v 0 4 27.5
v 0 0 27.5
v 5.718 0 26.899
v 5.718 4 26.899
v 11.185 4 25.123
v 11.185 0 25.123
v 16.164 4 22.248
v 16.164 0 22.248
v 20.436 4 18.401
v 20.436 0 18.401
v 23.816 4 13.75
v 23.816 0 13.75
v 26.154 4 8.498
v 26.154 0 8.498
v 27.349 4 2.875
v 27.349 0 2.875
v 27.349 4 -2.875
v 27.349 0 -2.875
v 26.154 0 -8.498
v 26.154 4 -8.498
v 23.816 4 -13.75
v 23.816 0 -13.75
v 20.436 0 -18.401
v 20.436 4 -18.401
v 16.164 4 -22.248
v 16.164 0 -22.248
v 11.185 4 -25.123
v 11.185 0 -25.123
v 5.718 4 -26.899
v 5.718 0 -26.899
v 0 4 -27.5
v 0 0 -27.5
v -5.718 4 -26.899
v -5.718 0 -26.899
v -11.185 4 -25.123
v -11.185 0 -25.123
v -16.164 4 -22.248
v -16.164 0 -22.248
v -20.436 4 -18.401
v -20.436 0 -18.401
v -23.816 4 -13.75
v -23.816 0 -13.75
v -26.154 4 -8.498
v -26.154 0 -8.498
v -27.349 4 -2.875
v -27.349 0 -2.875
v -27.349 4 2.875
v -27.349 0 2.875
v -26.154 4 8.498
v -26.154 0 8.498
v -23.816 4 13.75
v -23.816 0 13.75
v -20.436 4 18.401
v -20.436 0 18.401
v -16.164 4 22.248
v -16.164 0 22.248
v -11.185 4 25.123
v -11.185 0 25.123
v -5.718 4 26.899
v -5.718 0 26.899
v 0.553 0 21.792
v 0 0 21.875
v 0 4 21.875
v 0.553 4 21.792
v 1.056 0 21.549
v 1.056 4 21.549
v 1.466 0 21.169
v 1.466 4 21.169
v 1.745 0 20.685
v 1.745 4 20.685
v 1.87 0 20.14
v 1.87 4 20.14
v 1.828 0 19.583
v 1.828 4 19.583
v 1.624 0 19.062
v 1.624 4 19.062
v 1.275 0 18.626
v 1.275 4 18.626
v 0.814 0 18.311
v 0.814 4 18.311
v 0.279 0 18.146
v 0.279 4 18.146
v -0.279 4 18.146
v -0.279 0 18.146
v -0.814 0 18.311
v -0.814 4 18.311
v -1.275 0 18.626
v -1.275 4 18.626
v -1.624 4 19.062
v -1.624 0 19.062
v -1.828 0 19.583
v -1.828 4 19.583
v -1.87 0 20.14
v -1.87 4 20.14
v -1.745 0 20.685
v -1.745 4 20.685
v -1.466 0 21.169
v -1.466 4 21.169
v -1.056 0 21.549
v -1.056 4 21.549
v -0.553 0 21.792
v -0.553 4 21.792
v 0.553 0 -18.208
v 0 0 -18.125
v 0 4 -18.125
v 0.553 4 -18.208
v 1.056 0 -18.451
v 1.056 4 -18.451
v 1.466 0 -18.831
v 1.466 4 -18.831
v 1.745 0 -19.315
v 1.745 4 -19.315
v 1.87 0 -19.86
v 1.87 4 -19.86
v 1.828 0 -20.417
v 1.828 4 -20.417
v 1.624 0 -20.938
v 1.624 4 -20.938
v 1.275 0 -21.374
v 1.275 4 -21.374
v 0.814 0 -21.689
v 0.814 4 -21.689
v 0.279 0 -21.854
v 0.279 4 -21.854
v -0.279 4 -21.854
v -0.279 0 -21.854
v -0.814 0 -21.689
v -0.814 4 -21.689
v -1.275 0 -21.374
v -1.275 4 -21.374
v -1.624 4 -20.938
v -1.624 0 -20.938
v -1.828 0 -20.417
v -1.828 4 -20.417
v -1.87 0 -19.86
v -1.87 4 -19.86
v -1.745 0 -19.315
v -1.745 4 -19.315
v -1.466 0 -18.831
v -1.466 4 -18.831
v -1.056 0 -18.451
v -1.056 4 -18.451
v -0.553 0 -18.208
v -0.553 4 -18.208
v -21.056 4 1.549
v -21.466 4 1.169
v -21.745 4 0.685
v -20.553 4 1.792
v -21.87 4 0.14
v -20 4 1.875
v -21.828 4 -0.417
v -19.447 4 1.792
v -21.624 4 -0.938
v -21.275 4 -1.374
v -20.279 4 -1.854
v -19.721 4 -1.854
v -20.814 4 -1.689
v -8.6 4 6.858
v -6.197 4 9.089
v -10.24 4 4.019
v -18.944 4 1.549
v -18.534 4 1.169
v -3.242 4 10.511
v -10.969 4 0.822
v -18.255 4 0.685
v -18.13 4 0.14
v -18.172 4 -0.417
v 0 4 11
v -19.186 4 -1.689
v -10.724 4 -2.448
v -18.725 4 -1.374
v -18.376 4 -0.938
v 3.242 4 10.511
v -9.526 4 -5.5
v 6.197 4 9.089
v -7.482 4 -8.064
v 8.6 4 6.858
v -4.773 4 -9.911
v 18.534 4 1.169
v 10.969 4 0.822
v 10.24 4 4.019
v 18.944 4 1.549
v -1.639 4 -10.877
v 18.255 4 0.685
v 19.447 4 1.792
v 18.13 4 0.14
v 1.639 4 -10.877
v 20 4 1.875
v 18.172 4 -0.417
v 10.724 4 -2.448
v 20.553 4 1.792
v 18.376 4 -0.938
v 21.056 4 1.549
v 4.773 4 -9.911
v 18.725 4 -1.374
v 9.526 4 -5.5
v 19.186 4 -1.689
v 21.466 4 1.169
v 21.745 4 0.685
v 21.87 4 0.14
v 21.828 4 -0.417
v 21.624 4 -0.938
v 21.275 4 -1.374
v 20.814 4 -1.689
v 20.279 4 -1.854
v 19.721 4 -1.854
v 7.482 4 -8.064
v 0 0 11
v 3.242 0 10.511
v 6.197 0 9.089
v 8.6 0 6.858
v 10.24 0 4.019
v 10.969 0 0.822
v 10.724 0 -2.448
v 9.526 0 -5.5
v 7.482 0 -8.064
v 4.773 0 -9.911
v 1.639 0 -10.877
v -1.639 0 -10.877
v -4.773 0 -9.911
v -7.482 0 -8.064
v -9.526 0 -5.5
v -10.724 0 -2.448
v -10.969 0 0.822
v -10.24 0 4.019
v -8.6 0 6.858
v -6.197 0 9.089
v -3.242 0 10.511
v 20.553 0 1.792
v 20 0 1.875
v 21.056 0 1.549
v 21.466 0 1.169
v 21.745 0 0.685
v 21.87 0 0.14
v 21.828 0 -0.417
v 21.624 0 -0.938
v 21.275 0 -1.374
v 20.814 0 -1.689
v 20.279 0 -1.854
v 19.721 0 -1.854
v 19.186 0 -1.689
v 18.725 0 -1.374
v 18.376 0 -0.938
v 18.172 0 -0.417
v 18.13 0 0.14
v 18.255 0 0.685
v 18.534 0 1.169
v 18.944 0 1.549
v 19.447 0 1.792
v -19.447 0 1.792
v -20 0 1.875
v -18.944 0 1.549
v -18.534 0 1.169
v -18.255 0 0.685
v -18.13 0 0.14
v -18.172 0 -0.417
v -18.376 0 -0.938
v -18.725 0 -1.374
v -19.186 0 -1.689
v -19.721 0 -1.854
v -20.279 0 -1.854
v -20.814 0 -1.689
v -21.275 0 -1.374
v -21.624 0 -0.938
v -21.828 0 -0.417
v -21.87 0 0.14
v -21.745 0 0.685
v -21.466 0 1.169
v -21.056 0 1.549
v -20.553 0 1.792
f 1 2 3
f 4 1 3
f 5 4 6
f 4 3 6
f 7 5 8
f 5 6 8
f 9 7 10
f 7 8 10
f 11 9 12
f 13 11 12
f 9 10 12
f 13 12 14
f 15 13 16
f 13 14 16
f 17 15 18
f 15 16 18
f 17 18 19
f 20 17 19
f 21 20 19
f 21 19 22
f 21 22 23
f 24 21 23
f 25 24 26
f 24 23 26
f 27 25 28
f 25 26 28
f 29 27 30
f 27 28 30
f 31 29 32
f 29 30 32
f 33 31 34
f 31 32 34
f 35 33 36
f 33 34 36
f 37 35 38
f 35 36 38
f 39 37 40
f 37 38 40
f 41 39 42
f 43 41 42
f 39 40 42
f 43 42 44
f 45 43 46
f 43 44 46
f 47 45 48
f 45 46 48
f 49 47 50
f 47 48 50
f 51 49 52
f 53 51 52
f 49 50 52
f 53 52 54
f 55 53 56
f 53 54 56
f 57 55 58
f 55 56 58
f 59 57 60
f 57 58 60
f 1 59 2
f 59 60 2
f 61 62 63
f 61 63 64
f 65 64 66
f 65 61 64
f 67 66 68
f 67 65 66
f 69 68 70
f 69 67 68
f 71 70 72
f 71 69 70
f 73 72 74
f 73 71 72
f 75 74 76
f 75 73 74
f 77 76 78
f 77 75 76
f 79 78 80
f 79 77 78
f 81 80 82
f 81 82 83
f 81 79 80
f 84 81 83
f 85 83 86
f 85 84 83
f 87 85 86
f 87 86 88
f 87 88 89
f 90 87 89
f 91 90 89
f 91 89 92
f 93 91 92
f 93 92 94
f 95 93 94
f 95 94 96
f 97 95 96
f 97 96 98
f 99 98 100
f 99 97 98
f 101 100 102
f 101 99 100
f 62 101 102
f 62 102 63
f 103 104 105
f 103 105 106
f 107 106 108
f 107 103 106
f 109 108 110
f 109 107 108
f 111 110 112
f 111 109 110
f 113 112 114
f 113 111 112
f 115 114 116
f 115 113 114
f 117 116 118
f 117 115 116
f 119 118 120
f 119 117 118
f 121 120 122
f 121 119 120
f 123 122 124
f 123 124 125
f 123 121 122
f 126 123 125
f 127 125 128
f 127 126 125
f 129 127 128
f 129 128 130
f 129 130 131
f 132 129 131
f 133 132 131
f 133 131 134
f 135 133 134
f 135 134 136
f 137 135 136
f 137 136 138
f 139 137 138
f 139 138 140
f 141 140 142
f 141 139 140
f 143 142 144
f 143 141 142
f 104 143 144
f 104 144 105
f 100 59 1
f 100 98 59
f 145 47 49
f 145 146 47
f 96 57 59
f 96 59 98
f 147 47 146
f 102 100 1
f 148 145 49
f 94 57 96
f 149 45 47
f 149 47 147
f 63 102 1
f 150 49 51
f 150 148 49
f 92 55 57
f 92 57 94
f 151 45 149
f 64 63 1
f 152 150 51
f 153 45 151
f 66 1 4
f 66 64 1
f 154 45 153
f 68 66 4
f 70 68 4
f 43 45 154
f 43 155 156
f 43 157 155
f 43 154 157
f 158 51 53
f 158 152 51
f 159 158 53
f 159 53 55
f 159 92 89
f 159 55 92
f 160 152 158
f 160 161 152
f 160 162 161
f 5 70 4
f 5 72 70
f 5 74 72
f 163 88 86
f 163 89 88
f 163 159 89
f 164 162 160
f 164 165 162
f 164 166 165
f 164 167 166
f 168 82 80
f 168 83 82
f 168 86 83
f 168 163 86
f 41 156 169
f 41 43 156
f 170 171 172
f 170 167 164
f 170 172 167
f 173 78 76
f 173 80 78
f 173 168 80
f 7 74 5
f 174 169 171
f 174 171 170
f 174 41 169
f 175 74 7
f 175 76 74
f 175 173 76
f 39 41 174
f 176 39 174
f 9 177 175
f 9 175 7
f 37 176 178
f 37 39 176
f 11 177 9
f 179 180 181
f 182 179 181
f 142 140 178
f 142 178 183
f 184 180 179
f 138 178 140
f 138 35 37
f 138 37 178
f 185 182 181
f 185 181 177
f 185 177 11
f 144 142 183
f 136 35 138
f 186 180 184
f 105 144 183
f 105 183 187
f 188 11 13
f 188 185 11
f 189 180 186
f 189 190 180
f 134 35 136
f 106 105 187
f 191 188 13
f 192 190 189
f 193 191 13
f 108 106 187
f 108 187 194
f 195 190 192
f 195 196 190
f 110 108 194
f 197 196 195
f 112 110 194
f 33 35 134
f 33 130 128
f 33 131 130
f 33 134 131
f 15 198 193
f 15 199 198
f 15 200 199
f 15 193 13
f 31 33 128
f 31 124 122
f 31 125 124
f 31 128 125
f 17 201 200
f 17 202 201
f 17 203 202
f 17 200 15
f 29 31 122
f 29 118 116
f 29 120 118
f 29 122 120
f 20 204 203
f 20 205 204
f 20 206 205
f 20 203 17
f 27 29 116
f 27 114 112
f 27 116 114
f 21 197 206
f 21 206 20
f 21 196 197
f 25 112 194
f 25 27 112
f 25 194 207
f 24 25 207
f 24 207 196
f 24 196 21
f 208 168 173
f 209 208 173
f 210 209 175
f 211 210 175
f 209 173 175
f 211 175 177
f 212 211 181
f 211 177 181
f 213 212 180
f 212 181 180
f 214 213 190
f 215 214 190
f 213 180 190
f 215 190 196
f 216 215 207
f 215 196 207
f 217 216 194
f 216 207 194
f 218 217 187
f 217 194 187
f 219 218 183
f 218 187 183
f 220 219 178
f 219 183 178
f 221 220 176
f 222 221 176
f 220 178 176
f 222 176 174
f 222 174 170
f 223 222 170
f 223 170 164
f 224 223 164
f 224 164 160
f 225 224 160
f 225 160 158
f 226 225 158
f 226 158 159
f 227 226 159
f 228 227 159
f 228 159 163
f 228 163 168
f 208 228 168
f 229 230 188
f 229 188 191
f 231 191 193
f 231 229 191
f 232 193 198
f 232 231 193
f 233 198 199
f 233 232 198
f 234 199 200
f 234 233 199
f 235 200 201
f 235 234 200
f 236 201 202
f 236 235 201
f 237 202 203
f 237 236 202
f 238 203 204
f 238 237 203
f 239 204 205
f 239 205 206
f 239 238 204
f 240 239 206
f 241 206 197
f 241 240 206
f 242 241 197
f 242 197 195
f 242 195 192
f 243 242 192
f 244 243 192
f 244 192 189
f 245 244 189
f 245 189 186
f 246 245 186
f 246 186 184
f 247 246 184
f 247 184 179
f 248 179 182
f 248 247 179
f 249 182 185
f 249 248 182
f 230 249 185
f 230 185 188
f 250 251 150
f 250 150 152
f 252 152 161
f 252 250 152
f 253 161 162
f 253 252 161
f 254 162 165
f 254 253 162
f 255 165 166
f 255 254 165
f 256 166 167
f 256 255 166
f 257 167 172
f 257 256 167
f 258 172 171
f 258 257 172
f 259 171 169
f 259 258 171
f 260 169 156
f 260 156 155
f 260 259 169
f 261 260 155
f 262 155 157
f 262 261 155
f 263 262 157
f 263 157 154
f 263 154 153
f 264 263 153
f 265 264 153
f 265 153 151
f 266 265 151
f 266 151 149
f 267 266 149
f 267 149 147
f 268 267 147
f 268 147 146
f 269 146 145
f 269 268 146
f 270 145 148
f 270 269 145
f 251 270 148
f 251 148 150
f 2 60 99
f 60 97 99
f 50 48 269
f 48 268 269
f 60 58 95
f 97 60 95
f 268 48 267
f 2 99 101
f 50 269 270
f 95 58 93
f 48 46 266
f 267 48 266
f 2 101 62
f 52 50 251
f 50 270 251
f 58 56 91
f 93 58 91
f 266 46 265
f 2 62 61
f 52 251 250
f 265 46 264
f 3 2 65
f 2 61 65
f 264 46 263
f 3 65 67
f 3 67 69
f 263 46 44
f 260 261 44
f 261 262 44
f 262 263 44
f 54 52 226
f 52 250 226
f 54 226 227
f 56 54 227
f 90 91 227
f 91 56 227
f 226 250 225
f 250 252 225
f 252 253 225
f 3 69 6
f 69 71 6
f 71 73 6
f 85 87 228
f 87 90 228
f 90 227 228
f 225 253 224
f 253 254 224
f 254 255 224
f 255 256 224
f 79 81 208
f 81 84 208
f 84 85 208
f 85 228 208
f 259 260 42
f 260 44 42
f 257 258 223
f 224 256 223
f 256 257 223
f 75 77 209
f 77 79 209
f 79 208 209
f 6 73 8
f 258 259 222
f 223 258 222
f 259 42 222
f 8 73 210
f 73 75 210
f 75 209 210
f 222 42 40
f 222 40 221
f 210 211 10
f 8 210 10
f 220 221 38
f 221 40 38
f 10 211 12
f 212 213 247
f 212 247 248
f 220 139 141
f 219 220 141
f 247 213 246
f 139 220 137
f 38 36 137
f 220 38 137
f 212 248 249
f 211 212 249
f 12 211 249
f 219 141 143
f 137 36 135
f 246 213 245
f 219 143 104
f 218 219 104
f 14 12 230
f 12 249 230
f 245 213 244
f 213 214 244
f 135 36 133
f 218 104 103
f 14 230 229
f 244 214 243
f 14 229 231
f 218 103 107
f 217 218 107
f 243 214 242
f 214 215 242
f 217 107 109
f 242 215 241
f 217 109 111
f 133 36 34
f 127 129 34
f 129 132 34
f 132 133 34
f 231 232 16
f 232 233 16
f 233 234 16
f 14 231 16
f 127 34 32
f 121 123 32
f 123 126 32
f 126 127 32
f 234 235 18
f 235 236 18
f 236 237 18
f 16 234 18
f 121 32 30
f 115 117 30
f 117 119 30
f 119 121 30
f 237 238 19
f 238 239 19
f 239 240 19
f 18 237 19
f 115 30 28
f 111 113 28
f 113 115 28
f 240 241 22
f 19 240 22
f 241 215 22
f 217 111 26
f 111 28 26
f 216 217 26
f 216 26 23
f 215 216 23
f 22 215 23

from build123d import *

# Parameters (mm, degrees)
SKETCH1_R           = 27.5
SKETCH1_R_2         = 2.5
BOSS_EXTRUDE1_DEPTH = 4
SKETCH2_R           = 11
CUT_EXTRUDE1_DEPTH  = 15
BOSS_EXTRUDE3_START = -4
SKETCH3_R           = 2.5
SKETCH3_R_2         = 1.875
BOSS_EXTRUDE3_DEPTH = 4


with BuildPart() as part:
    # Sketch1 → Boss-Extrude1 (new body)
    with BuildSketch(Plane(origin=(0, 0, 0), x_dir=(1, 0, 0), z_dir=(0, 1, 0))):
        with Locations(Location((0, 0, 0), (0, 0, 270))):
            Circle(SKETCH1_R)
        with Locations(Location((0, 20, 0), (0, 0, 270))):
            Circle(SKETCH1_R_2, mode=Mode.SUBTRACT)
        with Locations(Location((-20, 0, 0), (0, 0, 270))):
            Circle(SKETCH1_R_2, mode=Mode.SUBTRACT)
        with Locations(Location((20, 0, 0), (0, 0, 270))):
            Circle(SKETCH1_R_2, mode=Mode.SUBTRACT)
        with Locations(Location((0, -20, 0), (0, 0, 270))):
            Circle(SKETCH1_R_2, mode=Mode.SUBTRACT)
    extrude(amount=BOSS_EXTRUDE1_DEPTH)

    # Sketch2 → Cut-Extrude1 (cut)
    with BuildSketch(Plane(origin=(0, 4, 0), x_dir=(1, 0, 0), z_dir=(0, 1, 0))):
        with Locations(Location((0, 0, 0), (0, 0, 270))):
            Circle(SKETCH2_R)
    extrude(amount=-CUT_EXTRUDE1_DEPTH, mode=Mode.SUBTRACT)

    # Sketch3 → Boss-Extrude3 (add)
    # profile 1 of 4: a face of its own
    with BuildSketch(Plane(origin=(0, 4, 0), x_dir=(1, 0, 0), z_dir=(0, 1, 0)).offset(BOSS_EXTRUDE3_START)):
        with Locations((0, -20)):
            Circle(SKETCH3_R)
        with Locations(Location((0, -20, 0), (0, 0, 270))):
            Circle(SKETCH3_R_2, mode=Mode.SUBTRACT)
    # profile 2 of 4: a face of its own
    with BuildSketch(Plane(origin=(0, 4, 0), x_dir=(1, 0, 0), z_dir=(0, 1, 0)).offset(BOSS_EXTRUDE3_START)):
        with Locations((20, 0)):
            Circle(SKETCH3_R)
        with Locations(Location((20, 0, 0), (0, 0, 270))):
            Circle(SKETCH3_R_2, mode=Mode.SUBTRACT)
    # profile 3 of 4: a face of its own
    with BuildSketch(Plane(origin=(0, 4, 0), x_dir=(1, 0, 0), z_dir=(0, 1, 0)).offset(BOSS_EXTRUDE3_START)):
        with Locations((0, 20)):
            Circle(SKETCH3_R)
        with Locations(Location((0, 20, 0), (0, 0, 270))):
            Circle(SKETCH3_R_2, mode=Mode.SUBTRACT)
    # profile 4 of 4: a face of its own
    with BuildSketch(Plane(origin=(0, 4, 0), x_dir=(1, 0, 0), z_dir=(0, 1, 0)).offset(BOSS_EXTRUDE3_START)):
        with Locations((-20, 0)):
            Circle(SKETCH3_R)
        with Locations(Location((-20, 0, 0), (0, 0, 270))):
            Circle(SKETCH3_R_2, mode=Mode.SUBTRACT)
    extrude(amount=BOSS_EXTRUDE3_DEPTH)


solid = part.part
